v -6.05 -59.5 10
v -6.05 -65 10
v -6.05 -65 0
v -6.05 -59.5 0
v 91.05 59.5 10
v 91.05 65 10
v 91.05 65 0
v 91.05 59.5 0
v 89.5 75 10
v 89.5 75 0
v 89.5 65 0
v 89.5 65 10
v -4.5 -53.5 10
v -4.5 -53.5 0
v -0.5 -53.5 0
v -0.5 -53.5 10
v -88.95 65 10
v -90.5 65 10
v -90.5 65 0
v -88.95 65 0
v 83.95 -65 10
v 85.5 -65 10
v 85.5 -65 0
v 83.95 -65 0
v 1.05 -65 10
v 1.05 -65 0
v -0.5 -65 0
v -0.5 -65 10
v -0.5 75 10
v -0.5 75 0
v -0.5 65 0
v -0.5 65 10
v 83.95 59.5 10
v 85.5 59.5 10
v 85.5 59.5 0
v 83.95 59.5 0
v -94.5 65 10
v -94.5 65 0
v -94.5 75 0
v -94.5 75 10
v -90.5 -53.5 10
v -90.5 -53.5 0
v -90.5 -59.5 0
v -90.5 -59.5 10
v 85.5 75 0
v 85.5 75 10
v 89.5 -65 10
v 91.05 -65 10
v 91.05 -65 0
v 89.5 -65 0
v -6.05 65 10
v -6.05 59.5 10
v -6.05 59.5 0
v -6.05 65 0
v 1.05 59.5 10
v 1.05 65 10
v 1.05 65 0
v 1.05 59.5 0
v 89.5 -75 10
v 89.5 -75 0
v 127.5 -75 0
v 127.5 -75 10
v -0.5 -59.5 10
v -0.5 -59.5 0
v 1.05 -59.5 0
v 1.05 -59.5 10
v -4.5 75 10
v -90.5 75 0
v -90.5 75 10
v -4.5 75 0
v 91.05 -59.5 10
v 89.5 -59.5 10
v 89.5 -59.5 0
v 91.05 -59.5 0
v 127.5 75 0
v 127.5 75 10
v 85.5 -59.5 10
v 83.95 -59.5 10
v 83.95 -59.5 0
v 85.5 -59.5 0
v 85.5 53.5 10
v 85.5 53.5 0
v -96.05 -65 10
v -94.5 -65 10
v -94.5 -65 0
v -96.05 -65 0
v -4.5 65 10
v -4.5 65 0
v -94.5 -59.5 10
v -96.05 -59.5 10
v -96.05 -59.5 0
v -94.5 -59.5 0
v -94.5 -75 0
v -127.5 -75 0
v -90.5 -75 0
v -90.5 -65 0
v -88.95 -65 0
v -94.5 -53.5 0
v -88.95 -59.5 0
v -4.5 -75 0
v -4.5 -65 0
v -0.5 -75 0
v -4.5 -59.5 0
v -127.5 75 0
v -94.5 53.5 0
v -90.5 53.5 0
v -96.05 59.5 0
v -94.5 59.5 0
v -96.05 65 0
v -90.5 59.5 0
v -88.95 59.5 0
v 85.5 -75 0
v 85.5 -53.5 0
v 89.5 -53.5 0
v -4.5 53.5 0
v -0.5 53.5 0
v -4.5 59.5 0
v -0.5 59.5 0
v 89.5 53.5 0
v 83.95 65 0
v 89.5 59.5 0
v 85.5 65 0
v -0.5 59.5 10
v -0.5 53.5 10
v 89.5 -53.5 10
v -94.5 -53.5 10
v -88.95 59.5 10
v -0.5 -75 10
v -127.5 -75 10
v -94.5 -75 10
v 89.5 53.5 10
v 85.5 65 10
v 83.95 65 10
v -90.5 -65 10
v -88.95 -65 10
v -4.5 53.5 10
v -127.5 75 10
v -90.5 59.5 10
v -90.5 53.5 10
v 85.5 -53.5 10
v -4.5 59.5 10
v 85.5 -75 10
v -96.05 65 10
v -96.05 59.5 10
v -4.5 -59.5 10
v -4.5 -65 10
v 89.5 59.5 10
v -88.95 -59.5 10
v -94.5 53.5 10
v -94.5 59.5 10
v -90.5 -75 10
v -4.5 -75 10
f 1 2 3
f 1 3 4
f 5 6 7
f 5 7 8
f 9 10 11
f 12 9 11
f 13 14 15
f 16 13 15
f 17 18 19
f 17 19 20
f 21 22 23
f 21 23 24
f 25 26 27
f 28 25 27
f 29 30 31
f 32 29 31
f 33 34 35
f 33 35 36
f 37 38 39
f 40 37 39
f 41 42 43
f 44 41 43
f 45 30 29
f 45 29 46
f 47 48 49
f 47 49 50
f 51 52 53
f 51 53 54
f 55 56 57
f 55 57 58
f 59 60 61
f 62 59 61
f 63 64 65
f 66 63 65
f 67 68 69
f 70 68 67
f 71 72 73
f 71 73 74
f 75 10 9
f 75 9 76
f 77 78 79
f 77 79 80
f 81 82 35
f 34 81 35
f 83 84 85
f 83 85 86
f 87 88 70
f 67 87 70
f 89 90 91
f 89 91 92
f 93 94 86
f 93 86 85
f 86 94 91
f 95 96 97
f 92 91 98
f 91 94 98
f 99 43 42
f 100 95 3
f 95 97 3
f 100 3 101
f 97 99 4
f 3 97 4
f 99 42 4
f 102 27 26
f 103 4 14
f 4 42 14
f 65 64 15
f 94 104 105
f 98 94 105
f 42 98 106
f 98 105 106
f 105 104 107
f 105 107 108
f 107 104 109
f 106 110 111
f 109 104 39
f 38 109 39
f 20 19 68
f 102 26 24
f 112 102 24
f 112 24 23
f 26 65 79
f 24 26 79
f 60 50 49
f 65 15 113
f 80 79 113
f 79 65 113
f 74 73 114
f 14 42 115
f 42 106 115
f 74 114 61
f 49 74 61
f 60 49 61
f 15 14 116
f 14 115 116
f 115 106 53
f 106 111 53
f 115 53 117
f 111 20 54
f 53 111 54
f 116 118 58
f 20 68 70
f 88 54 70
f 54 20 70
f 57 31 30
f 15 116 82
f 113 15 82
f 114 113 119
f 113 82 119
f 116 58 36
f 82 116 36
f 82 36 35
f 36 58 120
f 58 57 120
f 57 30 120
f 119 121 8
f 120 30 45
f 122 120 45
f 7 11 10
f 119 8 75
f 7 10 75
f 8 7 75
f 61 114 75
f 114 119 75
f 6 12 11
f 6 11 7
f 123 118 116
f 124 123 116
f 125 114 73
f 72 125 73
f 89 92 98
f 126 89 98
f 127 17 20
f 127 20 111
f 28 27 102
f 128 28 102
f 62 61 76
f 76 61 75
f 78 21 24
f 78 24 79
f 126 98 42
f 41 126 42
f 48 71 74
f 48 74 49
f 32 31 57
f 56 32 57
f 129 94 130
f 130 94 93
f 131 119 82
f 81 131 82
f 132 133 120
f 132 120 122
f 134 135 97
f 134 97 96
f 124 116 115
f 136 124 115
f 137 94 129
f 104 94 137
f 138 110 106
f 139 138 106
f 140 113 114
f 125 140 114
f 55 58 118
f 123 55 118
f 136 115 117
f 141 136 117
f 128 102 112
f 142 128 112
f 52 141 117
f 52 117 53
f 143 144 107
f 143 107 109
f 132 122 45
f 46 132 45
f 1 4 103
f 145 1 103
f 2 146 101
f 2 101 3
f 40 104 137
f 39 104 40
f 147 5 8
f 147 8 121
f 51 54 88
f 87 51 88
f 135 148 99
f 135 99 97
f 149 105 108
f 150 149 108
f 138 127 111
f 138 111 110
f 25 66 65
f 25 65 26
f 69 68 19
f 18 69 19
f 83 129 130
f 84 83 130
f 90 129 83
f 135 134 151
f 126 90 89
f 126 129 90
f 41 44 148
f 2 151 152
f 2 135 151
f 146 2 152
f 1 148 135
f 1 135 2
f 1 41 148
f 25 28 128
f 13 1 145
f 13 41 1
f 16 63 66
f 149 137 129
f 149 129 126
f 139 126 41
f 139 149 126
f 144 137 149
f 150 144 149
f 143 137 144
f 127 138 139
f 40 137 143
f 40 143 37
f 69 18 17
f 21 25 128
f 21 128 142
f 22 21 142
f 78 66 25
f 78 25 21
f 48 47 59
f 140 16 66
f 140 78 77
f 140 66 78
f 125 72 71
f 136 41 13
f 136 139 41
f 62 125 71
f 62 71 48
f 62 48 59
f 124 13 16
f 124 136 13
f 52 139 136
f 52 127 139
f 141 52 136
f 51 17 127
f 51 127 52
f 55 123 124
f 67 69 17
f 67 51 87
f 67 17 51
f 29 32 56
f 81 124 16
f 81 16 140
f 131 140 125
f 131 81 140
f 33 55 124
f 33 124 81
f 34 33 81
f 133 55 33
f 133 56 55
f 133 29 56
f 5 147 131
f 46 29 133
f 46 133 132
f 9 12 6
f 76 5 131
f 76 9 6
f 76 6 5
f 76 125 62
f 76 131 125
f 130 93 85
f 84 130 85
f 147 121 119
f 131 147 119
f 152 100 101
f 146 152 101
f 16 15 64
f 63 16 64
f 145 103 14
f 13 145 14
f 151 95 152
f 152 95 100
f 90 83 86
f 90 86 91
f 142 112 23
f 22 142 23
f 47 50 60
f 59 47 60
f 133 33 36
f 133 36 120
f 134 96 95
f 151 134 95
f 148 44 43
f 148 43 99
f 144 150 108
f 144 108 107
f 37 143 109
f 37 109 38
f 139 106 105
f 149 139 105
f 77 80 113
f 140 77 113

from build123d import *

# Parameters (mm, degrees)
ESQUISSE1_W             = 255
ESQUISSE1_H             = 150
BOSS_EXTRU_1_DEPTH      = 10
ENL_V_MAT_EXTRU_1_DEPTH = 10


with BuildPart() as part:
    # Esquisse1 → Boss.-Extru.1 (new body)
    with BuildSketch(Plane.XY):
        Rectangle(ESQUISSE1_W, ESQUISSE1_H)
    extrude(amount=BOSS_EXTRU_1_DEPTH)

    # Esquisse2 → Enlèv. mat.-Extru.1 (cut)
    with BuildSketch(Plane(origin=(0, 0, 0), x_dir=(-1, 0, 0), z_dir=(0, 0, -1))):
        Polygon((-89.5, 75), (-89.5, 65), (-91.05, 65), (-91.05, 59.5), (-89.5, 59.5), (-89.5, 53.5), (-85.5, 53.5), (-85.5, 59.5), (-83.95, 59.5), (-83.95, 65), (-85.5, 65), (-85.5, 75), align=None)
        Polygon((0.5, 75), (0.5, 65), (-1.05, 65), (-1.05, 59.5), (0.5, 59.5), (0.5, 53.5), (4.5, 53.5), (4.5, 59.5), (6.05, 59.5), (6.05, 65), (4.5, 65), (4.5, 75), align=None)
        Polygon((90.5, 75), (90.5, 65), (88.95, 65), (88.95, 59.5), (90.5, 59.5), (90.5, 53.5), (94.5, 53.5), (94.5, 59.5), (96.05, 59.5), (96.05, 65), (94.5, 65), (94.5, 75), align=None)
        Polygon((94.5, -75), (94.5, -65), (96.05, -65), (96.05, -59.5), (94.5, -59.5), (94.5, -53.5), (90.5, -53.5), (90.5, -59.5), (88.95, -59.5), (88.95, -65), (90.5, -65), (90.5, -75), align=None)
        Polygon((4.5, -75), (4.5, -65), (6.05, -65), (6.05, -59.5), (4.5, -59.5), (4.5, -53.5), (0.5, -53.5), (0.5, -59.5), (-1.05, -59.5), (-1.05, -65), (0.5, -65), (0.5, -75), align=None)
        Polygon((-85.5, -75), (-85.5, -65), (-83.95, -65), (-83.95, -59.5), (-85.5, -59.5), (-85.5, -53.5), (-89.5, -53.5), (-89.5, -59.5), (-91.05, -59.5), (-91.05, -65), (-89.5, -65), (-89.5, -75), align=None)
    extrude(amount=-ENL_V_MAT_EXTRU_1_DEPTH, mode=Mode.SUBTRACT)


solid = part.part
